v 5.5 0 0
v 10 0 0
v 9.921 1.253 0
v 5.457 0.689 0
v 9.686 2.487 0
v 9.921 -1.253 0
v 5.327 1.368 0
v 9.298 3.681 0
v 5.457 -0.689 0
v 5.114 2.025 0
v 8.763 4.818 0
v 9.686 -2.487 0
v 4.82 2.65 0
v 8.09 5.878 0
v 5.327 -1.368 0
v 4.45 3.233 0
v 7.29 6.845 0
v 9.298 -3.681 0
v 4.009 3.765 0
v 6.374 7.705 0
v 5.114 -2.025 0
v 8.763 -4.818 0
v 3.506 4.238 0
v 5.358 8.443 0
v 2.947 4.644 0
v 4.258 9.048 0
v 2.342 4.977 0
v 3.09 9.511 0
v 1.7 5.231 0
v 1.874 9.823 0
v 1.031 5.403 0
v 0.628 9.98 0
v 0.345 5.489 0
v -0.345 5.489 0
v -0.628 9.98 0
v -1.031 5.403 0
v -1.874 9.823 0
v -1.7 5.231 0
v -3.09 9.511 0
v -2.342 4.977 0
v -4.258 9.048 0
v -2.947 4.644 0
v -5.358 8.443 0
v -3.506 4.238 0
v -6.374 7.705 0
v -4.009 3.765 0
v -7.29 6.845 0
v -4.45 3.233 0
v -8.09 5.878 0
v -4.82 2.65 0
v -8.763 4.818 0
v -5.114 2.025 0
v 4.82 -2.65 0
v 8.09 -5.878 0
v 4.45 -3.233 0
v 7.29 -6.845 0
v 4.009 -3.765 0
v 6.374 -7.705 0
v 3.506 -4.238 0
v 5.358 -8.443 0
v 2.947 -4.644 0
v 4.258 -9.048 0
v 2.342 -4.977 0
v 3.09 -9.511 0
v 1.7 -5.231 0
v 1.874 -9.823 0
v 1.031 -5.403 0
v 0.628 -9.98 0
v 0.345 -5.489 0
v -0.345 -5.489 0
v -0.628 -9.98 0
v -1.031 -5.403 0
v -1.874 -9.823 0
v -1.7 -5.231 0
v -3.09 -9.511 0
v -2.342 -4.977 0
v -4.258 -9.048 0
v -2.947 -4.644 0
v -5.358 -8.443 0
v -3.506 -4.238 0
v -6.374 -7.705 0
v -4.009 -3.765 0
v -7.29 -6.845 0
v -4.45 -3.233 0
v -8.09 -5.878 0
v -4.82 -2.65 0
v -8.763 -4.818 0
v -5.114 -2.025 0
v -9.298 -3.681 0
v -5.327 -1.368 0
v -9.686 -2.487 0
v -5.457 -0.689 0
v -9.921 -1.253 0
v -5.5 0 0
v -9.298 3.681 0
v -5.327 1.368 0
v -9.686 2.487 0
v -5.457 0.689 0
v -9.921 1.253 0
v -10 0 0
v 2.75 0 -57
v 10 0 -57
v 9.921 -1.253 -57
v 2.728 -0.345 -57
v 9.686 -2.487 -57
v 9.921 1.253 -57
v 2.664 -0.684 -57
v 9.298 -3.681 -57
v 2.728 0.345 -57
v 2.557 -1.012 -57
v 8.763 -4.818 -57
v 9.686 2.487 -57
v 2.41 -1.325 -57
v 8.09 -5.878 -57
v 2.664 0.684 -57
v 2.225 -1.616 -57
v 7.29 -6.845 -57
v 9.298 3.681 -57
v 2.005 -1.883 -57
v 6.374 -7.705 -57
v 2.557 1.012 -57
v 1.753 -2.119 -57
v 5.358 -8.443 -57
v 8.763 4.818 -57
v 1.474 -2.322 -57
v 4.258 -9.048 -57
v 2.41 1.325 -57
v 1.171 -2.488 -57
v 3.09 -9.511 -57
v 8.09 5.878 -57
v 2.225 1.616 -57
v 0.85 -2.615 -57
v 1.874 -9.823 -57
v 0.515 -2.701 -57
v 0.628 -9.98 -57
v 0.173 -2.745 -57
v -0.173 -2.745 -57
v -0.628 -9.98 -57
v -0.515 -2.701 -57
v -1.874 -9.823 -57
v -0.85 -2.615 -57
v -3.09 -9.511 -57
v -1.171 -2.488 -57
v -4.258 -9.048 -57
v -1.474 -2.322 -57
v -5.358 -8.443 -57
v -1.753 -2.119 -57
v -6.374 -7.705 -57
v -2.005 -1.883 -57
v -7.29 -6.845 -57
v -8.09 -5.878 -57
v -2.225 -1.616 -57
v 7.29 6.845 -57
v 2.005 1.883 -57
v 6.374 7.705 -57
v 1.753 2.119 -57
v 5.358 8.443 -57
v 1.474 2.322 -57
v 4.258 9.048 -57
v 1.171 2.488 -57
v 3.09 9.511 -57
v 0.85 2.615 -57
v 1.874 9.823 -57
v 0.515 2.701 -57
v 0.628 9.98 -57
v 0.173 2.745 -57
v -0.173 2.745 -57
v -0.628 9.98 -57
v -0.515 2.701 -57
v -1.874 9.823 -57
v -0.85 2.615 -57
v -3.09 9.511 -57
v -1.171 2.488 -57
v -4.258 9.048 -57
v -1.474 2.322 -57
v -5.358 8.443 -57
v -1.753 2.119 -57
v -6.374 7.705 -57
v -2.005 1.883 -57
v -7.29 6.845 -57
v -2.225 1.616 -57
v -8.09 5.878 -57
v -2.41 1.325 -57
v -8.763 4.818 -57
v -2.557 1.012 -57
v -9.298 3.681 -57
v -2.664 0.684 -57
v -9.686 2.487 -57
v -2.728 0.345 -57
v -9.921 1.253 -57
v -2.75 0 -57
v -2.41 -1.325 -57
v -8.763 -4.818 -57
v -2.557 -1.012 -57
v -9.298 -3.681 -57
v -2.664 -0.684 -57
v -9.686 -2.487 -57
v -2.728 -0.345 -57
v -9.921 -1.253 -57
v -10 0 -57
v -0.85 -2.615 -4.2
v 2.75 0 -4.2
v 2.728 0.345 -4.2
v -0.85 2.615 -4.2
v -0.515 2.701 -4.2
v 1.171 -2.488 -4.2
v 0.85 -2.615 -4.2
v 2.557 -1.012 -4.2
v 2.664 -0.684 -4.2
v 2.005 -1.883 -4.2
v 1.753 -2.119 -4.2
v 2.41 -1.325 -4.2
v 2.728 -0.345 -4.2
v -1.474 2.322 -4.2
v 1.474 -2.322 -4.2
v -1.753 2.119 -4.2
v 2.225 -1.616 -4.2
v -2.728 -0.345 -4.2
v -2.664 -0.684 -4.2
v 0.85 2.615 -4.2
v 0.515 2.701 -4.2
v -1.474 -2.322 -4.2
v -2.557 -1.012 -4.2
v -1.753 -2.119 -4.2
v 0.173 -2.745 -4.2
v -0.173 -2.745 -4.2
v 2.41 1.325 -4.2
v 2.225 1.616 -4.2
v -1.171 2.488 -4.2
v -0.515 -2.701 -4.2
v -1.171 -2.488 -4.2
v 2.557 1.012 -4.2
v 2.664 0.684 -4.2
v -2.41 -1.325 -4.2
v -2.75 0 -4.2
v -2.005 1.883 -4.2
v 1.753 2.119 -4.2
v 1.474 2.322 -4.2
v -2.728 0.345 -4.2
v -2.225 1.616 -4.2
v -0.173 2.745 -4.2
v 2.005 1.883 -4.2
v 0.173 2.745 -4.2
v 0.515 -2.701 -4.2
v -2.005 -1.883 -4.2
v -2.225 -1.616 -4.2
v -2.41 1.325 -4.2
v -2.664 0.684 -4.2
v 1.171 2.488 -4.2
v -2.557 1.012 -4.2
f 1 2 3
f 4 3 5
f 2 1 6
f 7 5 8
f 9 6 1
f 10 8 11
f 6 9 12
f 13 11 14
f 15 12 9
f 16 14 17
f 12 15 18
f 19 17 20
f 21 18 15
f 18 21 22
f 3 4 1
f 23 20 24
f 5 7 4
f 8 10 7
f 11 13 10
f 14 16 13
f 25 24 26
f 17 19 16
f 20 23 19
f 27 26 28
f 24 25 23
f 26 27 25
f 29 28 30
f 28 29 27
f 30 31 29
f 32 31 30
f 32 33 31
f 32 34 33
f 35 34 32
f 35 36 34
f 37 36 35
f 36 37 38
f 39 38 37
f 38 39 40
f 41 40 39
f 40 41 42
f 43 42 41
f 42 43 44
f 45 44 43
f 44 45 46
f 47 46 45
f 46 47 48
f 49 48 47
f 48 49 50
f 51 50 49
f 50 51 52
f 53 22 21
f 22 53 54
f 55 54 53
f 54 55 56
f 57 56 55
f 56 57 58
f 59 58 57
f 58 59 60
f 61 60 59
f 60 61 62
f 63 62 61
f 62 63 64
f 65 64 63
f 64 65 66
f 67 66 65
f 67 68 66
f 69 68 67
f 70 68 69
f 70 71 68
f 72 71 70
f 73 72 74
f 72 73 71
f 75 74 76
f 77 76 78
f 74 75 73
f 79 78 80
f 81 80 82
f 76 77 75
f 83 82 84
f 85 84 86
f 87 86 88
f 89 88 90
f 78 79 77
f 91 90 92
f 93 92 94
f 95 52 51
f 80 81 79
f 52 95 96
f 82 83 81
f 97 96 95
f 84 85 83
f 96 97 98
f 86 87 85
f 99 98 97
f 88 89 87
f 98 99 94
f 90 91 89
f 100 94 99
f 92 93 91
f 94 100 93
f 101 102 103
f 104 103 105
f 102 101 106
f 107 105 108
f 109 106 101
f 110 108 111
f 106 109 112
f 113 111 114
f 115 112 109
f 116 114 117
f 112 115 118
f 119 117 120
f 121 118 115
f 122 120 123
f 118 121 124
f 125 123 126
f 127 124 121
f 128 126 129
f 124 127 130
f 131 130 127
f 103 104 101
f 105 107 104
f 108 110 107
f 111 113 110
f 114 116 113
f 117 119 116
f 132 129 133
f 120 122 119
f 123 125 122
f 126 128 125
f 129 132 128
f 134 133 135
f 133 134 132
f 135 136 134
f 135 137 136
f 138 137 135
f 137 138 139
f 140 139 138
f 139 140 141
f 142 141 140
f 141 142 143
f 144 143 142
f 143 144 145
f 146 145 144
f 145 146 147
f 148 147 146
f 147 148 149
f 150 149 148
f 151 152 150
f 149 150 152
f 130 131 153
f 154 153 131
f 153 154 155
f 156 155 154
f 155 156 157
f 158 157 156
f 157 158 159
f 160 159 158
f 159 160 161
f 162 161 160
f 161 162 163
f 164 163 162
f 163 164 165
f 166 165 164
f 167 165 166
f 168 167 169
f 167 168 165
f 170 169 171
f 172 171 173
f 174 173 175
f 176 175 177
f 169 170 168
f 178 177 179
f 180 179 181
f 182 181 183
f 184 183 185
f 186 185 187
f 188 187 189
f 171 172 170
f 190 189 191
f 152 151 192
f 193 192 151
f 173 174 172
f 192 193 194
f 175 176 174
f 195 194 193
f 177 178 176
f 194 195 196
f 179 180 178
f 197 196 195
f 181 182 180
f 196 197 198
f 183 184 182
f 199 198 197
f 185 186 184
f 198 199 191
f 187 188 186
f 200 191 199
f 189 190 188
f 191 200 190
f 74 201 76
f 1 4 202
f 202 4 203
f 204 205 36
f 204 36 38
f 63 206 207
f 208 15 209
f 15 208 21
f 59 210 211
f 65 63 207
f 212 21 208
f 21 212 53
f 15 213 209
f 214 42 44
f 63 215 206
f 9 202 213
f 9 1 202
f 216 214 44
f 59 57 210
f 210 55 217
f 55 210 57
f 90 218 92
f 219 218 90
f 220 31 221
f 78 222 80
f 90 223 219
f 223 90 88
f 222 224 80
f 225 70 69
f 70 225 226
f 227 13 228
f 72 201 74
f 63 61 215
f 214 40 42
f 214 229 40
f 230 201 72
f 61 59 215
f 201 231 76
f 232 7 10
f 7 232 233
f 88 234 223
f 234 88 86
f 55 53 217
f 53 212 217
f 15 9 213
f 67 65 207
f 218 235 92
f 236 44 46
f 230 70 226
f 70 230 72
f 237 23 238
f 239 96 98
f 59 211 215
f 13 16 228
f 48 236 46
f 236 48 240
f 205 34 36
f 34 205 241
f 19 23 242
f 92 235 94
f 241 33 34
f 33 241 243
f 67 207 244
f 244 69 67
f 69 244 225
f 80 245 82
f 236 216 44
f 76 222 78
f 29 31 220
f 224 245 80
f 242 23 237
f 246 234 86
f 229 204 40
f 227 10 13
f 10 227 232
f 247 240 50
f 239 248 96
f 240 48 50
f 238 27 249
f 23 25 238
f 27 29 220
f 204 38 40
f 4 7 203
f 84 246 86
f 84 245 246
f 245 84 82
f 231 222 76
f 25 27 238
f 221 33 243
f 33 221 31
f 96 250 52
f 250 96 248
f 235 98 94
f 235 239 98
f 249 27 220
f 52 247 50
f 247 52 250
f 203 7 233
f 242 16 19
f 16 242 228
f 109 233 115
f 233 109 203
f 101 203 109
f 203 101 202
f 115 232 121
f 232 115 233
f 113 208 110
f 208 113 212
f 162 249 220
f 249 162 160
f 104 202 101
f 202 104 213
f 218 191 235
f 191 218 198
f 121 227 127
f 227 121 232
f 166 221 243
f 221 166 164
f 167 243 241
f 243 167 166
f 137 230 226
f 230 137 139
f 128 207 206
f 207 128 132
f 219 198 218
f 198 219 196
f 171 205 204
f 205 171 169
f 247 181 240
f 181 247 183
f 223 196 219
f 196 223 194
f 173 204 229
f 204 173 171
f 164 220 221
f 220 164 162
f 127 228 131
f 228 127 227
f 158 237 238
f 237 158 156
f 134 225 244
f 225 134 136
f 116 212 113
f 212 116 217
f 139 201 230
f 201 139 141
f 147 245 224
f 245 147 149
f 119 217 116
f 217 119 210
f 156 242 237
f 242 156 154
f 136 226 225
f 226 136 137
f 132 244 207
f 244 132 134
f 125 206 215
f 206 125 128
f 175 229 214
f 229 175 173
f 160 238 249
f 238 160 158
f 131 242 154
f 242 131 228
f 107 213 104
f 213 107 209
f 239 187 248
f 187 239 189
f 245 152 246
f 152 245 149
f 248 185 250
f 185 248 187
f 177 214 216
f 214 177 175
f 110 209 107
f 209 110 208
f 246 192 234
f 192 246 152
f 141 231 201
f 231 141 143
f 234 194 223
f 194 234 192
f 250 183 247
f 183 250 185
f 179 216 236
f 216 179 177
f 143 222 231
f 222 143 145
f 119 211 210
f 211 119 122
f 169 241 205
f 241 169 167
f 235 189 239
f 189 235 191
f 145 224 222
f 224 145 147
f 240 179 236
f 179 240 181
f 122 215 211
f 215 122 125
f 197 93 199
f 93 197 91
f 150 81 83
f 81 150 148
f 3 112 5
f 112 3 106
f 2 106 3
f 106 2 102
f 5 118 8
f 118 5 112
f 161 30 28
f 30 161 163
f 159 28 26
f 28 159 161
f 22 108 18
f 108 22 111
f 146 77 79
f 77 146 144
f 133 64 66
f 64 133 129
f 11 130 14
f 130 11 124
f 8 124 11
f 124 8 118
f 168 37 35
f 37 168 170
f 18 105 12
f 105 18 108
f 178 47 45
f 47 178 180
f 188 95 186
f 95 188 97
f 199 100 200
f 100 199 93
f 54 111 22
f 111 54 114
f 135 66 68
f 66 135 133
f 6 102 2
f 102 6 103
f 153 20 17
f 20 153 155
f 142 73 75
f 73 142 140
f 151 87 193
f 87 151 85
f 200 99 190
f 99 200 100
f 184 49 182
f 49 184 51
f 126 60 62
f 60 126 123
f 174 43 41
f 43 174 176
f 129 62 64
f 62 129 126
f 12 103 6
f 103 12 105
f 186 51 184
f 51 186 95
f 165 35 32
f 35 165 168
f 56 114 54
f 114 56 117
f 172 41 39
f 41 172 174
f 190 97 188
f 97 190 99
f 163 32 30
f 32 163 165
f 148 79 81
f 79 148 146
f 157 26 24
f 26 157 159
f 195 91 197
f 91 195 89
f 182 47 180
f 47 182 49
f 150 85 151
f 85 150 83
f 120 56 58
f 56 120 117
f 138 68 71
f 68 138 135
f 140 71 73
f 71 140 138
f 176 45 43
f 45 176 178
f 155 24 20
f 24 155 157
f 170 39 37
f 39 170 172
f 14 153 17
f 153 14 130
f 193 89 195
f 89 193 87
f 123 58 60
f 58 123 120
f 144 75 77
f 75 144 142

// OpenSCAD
$fn = 50;


difference() {
	union() {
		translate(v = [0, 0, -57.0000000000]) {
			cylinder(h = 57, r = 10.0000000000);
		}
		cylinder(h = 0, r = 13.0000000000);
	}
	union() {
		translate(v = [0, 0, 0]) {
			rotate(a = [0, 0, 0]) {
				difference() {
					union() {
						#translate(v = [0, 0, -57.0000000000]) {
							cylinder(h = 57, r = 2.2500000000);
						}
						#translate(v = [0, 0, -4.2000000000]) {
							cylinder(h = 4.2000000000, r1 = 2.7500000000, r2 = 5.5000000000);
						}
						#translate(v = [0, 0, -57.0000000000]) {
							cylinder(h = 57, r = 2.7500000000);
						}
						#translate(v = [0, 0, -57.0000000000]) {
							cylinder(h = 57, r = 2.2500000000);
						}
					}
					union();
				}
			}
		}
	}
}
